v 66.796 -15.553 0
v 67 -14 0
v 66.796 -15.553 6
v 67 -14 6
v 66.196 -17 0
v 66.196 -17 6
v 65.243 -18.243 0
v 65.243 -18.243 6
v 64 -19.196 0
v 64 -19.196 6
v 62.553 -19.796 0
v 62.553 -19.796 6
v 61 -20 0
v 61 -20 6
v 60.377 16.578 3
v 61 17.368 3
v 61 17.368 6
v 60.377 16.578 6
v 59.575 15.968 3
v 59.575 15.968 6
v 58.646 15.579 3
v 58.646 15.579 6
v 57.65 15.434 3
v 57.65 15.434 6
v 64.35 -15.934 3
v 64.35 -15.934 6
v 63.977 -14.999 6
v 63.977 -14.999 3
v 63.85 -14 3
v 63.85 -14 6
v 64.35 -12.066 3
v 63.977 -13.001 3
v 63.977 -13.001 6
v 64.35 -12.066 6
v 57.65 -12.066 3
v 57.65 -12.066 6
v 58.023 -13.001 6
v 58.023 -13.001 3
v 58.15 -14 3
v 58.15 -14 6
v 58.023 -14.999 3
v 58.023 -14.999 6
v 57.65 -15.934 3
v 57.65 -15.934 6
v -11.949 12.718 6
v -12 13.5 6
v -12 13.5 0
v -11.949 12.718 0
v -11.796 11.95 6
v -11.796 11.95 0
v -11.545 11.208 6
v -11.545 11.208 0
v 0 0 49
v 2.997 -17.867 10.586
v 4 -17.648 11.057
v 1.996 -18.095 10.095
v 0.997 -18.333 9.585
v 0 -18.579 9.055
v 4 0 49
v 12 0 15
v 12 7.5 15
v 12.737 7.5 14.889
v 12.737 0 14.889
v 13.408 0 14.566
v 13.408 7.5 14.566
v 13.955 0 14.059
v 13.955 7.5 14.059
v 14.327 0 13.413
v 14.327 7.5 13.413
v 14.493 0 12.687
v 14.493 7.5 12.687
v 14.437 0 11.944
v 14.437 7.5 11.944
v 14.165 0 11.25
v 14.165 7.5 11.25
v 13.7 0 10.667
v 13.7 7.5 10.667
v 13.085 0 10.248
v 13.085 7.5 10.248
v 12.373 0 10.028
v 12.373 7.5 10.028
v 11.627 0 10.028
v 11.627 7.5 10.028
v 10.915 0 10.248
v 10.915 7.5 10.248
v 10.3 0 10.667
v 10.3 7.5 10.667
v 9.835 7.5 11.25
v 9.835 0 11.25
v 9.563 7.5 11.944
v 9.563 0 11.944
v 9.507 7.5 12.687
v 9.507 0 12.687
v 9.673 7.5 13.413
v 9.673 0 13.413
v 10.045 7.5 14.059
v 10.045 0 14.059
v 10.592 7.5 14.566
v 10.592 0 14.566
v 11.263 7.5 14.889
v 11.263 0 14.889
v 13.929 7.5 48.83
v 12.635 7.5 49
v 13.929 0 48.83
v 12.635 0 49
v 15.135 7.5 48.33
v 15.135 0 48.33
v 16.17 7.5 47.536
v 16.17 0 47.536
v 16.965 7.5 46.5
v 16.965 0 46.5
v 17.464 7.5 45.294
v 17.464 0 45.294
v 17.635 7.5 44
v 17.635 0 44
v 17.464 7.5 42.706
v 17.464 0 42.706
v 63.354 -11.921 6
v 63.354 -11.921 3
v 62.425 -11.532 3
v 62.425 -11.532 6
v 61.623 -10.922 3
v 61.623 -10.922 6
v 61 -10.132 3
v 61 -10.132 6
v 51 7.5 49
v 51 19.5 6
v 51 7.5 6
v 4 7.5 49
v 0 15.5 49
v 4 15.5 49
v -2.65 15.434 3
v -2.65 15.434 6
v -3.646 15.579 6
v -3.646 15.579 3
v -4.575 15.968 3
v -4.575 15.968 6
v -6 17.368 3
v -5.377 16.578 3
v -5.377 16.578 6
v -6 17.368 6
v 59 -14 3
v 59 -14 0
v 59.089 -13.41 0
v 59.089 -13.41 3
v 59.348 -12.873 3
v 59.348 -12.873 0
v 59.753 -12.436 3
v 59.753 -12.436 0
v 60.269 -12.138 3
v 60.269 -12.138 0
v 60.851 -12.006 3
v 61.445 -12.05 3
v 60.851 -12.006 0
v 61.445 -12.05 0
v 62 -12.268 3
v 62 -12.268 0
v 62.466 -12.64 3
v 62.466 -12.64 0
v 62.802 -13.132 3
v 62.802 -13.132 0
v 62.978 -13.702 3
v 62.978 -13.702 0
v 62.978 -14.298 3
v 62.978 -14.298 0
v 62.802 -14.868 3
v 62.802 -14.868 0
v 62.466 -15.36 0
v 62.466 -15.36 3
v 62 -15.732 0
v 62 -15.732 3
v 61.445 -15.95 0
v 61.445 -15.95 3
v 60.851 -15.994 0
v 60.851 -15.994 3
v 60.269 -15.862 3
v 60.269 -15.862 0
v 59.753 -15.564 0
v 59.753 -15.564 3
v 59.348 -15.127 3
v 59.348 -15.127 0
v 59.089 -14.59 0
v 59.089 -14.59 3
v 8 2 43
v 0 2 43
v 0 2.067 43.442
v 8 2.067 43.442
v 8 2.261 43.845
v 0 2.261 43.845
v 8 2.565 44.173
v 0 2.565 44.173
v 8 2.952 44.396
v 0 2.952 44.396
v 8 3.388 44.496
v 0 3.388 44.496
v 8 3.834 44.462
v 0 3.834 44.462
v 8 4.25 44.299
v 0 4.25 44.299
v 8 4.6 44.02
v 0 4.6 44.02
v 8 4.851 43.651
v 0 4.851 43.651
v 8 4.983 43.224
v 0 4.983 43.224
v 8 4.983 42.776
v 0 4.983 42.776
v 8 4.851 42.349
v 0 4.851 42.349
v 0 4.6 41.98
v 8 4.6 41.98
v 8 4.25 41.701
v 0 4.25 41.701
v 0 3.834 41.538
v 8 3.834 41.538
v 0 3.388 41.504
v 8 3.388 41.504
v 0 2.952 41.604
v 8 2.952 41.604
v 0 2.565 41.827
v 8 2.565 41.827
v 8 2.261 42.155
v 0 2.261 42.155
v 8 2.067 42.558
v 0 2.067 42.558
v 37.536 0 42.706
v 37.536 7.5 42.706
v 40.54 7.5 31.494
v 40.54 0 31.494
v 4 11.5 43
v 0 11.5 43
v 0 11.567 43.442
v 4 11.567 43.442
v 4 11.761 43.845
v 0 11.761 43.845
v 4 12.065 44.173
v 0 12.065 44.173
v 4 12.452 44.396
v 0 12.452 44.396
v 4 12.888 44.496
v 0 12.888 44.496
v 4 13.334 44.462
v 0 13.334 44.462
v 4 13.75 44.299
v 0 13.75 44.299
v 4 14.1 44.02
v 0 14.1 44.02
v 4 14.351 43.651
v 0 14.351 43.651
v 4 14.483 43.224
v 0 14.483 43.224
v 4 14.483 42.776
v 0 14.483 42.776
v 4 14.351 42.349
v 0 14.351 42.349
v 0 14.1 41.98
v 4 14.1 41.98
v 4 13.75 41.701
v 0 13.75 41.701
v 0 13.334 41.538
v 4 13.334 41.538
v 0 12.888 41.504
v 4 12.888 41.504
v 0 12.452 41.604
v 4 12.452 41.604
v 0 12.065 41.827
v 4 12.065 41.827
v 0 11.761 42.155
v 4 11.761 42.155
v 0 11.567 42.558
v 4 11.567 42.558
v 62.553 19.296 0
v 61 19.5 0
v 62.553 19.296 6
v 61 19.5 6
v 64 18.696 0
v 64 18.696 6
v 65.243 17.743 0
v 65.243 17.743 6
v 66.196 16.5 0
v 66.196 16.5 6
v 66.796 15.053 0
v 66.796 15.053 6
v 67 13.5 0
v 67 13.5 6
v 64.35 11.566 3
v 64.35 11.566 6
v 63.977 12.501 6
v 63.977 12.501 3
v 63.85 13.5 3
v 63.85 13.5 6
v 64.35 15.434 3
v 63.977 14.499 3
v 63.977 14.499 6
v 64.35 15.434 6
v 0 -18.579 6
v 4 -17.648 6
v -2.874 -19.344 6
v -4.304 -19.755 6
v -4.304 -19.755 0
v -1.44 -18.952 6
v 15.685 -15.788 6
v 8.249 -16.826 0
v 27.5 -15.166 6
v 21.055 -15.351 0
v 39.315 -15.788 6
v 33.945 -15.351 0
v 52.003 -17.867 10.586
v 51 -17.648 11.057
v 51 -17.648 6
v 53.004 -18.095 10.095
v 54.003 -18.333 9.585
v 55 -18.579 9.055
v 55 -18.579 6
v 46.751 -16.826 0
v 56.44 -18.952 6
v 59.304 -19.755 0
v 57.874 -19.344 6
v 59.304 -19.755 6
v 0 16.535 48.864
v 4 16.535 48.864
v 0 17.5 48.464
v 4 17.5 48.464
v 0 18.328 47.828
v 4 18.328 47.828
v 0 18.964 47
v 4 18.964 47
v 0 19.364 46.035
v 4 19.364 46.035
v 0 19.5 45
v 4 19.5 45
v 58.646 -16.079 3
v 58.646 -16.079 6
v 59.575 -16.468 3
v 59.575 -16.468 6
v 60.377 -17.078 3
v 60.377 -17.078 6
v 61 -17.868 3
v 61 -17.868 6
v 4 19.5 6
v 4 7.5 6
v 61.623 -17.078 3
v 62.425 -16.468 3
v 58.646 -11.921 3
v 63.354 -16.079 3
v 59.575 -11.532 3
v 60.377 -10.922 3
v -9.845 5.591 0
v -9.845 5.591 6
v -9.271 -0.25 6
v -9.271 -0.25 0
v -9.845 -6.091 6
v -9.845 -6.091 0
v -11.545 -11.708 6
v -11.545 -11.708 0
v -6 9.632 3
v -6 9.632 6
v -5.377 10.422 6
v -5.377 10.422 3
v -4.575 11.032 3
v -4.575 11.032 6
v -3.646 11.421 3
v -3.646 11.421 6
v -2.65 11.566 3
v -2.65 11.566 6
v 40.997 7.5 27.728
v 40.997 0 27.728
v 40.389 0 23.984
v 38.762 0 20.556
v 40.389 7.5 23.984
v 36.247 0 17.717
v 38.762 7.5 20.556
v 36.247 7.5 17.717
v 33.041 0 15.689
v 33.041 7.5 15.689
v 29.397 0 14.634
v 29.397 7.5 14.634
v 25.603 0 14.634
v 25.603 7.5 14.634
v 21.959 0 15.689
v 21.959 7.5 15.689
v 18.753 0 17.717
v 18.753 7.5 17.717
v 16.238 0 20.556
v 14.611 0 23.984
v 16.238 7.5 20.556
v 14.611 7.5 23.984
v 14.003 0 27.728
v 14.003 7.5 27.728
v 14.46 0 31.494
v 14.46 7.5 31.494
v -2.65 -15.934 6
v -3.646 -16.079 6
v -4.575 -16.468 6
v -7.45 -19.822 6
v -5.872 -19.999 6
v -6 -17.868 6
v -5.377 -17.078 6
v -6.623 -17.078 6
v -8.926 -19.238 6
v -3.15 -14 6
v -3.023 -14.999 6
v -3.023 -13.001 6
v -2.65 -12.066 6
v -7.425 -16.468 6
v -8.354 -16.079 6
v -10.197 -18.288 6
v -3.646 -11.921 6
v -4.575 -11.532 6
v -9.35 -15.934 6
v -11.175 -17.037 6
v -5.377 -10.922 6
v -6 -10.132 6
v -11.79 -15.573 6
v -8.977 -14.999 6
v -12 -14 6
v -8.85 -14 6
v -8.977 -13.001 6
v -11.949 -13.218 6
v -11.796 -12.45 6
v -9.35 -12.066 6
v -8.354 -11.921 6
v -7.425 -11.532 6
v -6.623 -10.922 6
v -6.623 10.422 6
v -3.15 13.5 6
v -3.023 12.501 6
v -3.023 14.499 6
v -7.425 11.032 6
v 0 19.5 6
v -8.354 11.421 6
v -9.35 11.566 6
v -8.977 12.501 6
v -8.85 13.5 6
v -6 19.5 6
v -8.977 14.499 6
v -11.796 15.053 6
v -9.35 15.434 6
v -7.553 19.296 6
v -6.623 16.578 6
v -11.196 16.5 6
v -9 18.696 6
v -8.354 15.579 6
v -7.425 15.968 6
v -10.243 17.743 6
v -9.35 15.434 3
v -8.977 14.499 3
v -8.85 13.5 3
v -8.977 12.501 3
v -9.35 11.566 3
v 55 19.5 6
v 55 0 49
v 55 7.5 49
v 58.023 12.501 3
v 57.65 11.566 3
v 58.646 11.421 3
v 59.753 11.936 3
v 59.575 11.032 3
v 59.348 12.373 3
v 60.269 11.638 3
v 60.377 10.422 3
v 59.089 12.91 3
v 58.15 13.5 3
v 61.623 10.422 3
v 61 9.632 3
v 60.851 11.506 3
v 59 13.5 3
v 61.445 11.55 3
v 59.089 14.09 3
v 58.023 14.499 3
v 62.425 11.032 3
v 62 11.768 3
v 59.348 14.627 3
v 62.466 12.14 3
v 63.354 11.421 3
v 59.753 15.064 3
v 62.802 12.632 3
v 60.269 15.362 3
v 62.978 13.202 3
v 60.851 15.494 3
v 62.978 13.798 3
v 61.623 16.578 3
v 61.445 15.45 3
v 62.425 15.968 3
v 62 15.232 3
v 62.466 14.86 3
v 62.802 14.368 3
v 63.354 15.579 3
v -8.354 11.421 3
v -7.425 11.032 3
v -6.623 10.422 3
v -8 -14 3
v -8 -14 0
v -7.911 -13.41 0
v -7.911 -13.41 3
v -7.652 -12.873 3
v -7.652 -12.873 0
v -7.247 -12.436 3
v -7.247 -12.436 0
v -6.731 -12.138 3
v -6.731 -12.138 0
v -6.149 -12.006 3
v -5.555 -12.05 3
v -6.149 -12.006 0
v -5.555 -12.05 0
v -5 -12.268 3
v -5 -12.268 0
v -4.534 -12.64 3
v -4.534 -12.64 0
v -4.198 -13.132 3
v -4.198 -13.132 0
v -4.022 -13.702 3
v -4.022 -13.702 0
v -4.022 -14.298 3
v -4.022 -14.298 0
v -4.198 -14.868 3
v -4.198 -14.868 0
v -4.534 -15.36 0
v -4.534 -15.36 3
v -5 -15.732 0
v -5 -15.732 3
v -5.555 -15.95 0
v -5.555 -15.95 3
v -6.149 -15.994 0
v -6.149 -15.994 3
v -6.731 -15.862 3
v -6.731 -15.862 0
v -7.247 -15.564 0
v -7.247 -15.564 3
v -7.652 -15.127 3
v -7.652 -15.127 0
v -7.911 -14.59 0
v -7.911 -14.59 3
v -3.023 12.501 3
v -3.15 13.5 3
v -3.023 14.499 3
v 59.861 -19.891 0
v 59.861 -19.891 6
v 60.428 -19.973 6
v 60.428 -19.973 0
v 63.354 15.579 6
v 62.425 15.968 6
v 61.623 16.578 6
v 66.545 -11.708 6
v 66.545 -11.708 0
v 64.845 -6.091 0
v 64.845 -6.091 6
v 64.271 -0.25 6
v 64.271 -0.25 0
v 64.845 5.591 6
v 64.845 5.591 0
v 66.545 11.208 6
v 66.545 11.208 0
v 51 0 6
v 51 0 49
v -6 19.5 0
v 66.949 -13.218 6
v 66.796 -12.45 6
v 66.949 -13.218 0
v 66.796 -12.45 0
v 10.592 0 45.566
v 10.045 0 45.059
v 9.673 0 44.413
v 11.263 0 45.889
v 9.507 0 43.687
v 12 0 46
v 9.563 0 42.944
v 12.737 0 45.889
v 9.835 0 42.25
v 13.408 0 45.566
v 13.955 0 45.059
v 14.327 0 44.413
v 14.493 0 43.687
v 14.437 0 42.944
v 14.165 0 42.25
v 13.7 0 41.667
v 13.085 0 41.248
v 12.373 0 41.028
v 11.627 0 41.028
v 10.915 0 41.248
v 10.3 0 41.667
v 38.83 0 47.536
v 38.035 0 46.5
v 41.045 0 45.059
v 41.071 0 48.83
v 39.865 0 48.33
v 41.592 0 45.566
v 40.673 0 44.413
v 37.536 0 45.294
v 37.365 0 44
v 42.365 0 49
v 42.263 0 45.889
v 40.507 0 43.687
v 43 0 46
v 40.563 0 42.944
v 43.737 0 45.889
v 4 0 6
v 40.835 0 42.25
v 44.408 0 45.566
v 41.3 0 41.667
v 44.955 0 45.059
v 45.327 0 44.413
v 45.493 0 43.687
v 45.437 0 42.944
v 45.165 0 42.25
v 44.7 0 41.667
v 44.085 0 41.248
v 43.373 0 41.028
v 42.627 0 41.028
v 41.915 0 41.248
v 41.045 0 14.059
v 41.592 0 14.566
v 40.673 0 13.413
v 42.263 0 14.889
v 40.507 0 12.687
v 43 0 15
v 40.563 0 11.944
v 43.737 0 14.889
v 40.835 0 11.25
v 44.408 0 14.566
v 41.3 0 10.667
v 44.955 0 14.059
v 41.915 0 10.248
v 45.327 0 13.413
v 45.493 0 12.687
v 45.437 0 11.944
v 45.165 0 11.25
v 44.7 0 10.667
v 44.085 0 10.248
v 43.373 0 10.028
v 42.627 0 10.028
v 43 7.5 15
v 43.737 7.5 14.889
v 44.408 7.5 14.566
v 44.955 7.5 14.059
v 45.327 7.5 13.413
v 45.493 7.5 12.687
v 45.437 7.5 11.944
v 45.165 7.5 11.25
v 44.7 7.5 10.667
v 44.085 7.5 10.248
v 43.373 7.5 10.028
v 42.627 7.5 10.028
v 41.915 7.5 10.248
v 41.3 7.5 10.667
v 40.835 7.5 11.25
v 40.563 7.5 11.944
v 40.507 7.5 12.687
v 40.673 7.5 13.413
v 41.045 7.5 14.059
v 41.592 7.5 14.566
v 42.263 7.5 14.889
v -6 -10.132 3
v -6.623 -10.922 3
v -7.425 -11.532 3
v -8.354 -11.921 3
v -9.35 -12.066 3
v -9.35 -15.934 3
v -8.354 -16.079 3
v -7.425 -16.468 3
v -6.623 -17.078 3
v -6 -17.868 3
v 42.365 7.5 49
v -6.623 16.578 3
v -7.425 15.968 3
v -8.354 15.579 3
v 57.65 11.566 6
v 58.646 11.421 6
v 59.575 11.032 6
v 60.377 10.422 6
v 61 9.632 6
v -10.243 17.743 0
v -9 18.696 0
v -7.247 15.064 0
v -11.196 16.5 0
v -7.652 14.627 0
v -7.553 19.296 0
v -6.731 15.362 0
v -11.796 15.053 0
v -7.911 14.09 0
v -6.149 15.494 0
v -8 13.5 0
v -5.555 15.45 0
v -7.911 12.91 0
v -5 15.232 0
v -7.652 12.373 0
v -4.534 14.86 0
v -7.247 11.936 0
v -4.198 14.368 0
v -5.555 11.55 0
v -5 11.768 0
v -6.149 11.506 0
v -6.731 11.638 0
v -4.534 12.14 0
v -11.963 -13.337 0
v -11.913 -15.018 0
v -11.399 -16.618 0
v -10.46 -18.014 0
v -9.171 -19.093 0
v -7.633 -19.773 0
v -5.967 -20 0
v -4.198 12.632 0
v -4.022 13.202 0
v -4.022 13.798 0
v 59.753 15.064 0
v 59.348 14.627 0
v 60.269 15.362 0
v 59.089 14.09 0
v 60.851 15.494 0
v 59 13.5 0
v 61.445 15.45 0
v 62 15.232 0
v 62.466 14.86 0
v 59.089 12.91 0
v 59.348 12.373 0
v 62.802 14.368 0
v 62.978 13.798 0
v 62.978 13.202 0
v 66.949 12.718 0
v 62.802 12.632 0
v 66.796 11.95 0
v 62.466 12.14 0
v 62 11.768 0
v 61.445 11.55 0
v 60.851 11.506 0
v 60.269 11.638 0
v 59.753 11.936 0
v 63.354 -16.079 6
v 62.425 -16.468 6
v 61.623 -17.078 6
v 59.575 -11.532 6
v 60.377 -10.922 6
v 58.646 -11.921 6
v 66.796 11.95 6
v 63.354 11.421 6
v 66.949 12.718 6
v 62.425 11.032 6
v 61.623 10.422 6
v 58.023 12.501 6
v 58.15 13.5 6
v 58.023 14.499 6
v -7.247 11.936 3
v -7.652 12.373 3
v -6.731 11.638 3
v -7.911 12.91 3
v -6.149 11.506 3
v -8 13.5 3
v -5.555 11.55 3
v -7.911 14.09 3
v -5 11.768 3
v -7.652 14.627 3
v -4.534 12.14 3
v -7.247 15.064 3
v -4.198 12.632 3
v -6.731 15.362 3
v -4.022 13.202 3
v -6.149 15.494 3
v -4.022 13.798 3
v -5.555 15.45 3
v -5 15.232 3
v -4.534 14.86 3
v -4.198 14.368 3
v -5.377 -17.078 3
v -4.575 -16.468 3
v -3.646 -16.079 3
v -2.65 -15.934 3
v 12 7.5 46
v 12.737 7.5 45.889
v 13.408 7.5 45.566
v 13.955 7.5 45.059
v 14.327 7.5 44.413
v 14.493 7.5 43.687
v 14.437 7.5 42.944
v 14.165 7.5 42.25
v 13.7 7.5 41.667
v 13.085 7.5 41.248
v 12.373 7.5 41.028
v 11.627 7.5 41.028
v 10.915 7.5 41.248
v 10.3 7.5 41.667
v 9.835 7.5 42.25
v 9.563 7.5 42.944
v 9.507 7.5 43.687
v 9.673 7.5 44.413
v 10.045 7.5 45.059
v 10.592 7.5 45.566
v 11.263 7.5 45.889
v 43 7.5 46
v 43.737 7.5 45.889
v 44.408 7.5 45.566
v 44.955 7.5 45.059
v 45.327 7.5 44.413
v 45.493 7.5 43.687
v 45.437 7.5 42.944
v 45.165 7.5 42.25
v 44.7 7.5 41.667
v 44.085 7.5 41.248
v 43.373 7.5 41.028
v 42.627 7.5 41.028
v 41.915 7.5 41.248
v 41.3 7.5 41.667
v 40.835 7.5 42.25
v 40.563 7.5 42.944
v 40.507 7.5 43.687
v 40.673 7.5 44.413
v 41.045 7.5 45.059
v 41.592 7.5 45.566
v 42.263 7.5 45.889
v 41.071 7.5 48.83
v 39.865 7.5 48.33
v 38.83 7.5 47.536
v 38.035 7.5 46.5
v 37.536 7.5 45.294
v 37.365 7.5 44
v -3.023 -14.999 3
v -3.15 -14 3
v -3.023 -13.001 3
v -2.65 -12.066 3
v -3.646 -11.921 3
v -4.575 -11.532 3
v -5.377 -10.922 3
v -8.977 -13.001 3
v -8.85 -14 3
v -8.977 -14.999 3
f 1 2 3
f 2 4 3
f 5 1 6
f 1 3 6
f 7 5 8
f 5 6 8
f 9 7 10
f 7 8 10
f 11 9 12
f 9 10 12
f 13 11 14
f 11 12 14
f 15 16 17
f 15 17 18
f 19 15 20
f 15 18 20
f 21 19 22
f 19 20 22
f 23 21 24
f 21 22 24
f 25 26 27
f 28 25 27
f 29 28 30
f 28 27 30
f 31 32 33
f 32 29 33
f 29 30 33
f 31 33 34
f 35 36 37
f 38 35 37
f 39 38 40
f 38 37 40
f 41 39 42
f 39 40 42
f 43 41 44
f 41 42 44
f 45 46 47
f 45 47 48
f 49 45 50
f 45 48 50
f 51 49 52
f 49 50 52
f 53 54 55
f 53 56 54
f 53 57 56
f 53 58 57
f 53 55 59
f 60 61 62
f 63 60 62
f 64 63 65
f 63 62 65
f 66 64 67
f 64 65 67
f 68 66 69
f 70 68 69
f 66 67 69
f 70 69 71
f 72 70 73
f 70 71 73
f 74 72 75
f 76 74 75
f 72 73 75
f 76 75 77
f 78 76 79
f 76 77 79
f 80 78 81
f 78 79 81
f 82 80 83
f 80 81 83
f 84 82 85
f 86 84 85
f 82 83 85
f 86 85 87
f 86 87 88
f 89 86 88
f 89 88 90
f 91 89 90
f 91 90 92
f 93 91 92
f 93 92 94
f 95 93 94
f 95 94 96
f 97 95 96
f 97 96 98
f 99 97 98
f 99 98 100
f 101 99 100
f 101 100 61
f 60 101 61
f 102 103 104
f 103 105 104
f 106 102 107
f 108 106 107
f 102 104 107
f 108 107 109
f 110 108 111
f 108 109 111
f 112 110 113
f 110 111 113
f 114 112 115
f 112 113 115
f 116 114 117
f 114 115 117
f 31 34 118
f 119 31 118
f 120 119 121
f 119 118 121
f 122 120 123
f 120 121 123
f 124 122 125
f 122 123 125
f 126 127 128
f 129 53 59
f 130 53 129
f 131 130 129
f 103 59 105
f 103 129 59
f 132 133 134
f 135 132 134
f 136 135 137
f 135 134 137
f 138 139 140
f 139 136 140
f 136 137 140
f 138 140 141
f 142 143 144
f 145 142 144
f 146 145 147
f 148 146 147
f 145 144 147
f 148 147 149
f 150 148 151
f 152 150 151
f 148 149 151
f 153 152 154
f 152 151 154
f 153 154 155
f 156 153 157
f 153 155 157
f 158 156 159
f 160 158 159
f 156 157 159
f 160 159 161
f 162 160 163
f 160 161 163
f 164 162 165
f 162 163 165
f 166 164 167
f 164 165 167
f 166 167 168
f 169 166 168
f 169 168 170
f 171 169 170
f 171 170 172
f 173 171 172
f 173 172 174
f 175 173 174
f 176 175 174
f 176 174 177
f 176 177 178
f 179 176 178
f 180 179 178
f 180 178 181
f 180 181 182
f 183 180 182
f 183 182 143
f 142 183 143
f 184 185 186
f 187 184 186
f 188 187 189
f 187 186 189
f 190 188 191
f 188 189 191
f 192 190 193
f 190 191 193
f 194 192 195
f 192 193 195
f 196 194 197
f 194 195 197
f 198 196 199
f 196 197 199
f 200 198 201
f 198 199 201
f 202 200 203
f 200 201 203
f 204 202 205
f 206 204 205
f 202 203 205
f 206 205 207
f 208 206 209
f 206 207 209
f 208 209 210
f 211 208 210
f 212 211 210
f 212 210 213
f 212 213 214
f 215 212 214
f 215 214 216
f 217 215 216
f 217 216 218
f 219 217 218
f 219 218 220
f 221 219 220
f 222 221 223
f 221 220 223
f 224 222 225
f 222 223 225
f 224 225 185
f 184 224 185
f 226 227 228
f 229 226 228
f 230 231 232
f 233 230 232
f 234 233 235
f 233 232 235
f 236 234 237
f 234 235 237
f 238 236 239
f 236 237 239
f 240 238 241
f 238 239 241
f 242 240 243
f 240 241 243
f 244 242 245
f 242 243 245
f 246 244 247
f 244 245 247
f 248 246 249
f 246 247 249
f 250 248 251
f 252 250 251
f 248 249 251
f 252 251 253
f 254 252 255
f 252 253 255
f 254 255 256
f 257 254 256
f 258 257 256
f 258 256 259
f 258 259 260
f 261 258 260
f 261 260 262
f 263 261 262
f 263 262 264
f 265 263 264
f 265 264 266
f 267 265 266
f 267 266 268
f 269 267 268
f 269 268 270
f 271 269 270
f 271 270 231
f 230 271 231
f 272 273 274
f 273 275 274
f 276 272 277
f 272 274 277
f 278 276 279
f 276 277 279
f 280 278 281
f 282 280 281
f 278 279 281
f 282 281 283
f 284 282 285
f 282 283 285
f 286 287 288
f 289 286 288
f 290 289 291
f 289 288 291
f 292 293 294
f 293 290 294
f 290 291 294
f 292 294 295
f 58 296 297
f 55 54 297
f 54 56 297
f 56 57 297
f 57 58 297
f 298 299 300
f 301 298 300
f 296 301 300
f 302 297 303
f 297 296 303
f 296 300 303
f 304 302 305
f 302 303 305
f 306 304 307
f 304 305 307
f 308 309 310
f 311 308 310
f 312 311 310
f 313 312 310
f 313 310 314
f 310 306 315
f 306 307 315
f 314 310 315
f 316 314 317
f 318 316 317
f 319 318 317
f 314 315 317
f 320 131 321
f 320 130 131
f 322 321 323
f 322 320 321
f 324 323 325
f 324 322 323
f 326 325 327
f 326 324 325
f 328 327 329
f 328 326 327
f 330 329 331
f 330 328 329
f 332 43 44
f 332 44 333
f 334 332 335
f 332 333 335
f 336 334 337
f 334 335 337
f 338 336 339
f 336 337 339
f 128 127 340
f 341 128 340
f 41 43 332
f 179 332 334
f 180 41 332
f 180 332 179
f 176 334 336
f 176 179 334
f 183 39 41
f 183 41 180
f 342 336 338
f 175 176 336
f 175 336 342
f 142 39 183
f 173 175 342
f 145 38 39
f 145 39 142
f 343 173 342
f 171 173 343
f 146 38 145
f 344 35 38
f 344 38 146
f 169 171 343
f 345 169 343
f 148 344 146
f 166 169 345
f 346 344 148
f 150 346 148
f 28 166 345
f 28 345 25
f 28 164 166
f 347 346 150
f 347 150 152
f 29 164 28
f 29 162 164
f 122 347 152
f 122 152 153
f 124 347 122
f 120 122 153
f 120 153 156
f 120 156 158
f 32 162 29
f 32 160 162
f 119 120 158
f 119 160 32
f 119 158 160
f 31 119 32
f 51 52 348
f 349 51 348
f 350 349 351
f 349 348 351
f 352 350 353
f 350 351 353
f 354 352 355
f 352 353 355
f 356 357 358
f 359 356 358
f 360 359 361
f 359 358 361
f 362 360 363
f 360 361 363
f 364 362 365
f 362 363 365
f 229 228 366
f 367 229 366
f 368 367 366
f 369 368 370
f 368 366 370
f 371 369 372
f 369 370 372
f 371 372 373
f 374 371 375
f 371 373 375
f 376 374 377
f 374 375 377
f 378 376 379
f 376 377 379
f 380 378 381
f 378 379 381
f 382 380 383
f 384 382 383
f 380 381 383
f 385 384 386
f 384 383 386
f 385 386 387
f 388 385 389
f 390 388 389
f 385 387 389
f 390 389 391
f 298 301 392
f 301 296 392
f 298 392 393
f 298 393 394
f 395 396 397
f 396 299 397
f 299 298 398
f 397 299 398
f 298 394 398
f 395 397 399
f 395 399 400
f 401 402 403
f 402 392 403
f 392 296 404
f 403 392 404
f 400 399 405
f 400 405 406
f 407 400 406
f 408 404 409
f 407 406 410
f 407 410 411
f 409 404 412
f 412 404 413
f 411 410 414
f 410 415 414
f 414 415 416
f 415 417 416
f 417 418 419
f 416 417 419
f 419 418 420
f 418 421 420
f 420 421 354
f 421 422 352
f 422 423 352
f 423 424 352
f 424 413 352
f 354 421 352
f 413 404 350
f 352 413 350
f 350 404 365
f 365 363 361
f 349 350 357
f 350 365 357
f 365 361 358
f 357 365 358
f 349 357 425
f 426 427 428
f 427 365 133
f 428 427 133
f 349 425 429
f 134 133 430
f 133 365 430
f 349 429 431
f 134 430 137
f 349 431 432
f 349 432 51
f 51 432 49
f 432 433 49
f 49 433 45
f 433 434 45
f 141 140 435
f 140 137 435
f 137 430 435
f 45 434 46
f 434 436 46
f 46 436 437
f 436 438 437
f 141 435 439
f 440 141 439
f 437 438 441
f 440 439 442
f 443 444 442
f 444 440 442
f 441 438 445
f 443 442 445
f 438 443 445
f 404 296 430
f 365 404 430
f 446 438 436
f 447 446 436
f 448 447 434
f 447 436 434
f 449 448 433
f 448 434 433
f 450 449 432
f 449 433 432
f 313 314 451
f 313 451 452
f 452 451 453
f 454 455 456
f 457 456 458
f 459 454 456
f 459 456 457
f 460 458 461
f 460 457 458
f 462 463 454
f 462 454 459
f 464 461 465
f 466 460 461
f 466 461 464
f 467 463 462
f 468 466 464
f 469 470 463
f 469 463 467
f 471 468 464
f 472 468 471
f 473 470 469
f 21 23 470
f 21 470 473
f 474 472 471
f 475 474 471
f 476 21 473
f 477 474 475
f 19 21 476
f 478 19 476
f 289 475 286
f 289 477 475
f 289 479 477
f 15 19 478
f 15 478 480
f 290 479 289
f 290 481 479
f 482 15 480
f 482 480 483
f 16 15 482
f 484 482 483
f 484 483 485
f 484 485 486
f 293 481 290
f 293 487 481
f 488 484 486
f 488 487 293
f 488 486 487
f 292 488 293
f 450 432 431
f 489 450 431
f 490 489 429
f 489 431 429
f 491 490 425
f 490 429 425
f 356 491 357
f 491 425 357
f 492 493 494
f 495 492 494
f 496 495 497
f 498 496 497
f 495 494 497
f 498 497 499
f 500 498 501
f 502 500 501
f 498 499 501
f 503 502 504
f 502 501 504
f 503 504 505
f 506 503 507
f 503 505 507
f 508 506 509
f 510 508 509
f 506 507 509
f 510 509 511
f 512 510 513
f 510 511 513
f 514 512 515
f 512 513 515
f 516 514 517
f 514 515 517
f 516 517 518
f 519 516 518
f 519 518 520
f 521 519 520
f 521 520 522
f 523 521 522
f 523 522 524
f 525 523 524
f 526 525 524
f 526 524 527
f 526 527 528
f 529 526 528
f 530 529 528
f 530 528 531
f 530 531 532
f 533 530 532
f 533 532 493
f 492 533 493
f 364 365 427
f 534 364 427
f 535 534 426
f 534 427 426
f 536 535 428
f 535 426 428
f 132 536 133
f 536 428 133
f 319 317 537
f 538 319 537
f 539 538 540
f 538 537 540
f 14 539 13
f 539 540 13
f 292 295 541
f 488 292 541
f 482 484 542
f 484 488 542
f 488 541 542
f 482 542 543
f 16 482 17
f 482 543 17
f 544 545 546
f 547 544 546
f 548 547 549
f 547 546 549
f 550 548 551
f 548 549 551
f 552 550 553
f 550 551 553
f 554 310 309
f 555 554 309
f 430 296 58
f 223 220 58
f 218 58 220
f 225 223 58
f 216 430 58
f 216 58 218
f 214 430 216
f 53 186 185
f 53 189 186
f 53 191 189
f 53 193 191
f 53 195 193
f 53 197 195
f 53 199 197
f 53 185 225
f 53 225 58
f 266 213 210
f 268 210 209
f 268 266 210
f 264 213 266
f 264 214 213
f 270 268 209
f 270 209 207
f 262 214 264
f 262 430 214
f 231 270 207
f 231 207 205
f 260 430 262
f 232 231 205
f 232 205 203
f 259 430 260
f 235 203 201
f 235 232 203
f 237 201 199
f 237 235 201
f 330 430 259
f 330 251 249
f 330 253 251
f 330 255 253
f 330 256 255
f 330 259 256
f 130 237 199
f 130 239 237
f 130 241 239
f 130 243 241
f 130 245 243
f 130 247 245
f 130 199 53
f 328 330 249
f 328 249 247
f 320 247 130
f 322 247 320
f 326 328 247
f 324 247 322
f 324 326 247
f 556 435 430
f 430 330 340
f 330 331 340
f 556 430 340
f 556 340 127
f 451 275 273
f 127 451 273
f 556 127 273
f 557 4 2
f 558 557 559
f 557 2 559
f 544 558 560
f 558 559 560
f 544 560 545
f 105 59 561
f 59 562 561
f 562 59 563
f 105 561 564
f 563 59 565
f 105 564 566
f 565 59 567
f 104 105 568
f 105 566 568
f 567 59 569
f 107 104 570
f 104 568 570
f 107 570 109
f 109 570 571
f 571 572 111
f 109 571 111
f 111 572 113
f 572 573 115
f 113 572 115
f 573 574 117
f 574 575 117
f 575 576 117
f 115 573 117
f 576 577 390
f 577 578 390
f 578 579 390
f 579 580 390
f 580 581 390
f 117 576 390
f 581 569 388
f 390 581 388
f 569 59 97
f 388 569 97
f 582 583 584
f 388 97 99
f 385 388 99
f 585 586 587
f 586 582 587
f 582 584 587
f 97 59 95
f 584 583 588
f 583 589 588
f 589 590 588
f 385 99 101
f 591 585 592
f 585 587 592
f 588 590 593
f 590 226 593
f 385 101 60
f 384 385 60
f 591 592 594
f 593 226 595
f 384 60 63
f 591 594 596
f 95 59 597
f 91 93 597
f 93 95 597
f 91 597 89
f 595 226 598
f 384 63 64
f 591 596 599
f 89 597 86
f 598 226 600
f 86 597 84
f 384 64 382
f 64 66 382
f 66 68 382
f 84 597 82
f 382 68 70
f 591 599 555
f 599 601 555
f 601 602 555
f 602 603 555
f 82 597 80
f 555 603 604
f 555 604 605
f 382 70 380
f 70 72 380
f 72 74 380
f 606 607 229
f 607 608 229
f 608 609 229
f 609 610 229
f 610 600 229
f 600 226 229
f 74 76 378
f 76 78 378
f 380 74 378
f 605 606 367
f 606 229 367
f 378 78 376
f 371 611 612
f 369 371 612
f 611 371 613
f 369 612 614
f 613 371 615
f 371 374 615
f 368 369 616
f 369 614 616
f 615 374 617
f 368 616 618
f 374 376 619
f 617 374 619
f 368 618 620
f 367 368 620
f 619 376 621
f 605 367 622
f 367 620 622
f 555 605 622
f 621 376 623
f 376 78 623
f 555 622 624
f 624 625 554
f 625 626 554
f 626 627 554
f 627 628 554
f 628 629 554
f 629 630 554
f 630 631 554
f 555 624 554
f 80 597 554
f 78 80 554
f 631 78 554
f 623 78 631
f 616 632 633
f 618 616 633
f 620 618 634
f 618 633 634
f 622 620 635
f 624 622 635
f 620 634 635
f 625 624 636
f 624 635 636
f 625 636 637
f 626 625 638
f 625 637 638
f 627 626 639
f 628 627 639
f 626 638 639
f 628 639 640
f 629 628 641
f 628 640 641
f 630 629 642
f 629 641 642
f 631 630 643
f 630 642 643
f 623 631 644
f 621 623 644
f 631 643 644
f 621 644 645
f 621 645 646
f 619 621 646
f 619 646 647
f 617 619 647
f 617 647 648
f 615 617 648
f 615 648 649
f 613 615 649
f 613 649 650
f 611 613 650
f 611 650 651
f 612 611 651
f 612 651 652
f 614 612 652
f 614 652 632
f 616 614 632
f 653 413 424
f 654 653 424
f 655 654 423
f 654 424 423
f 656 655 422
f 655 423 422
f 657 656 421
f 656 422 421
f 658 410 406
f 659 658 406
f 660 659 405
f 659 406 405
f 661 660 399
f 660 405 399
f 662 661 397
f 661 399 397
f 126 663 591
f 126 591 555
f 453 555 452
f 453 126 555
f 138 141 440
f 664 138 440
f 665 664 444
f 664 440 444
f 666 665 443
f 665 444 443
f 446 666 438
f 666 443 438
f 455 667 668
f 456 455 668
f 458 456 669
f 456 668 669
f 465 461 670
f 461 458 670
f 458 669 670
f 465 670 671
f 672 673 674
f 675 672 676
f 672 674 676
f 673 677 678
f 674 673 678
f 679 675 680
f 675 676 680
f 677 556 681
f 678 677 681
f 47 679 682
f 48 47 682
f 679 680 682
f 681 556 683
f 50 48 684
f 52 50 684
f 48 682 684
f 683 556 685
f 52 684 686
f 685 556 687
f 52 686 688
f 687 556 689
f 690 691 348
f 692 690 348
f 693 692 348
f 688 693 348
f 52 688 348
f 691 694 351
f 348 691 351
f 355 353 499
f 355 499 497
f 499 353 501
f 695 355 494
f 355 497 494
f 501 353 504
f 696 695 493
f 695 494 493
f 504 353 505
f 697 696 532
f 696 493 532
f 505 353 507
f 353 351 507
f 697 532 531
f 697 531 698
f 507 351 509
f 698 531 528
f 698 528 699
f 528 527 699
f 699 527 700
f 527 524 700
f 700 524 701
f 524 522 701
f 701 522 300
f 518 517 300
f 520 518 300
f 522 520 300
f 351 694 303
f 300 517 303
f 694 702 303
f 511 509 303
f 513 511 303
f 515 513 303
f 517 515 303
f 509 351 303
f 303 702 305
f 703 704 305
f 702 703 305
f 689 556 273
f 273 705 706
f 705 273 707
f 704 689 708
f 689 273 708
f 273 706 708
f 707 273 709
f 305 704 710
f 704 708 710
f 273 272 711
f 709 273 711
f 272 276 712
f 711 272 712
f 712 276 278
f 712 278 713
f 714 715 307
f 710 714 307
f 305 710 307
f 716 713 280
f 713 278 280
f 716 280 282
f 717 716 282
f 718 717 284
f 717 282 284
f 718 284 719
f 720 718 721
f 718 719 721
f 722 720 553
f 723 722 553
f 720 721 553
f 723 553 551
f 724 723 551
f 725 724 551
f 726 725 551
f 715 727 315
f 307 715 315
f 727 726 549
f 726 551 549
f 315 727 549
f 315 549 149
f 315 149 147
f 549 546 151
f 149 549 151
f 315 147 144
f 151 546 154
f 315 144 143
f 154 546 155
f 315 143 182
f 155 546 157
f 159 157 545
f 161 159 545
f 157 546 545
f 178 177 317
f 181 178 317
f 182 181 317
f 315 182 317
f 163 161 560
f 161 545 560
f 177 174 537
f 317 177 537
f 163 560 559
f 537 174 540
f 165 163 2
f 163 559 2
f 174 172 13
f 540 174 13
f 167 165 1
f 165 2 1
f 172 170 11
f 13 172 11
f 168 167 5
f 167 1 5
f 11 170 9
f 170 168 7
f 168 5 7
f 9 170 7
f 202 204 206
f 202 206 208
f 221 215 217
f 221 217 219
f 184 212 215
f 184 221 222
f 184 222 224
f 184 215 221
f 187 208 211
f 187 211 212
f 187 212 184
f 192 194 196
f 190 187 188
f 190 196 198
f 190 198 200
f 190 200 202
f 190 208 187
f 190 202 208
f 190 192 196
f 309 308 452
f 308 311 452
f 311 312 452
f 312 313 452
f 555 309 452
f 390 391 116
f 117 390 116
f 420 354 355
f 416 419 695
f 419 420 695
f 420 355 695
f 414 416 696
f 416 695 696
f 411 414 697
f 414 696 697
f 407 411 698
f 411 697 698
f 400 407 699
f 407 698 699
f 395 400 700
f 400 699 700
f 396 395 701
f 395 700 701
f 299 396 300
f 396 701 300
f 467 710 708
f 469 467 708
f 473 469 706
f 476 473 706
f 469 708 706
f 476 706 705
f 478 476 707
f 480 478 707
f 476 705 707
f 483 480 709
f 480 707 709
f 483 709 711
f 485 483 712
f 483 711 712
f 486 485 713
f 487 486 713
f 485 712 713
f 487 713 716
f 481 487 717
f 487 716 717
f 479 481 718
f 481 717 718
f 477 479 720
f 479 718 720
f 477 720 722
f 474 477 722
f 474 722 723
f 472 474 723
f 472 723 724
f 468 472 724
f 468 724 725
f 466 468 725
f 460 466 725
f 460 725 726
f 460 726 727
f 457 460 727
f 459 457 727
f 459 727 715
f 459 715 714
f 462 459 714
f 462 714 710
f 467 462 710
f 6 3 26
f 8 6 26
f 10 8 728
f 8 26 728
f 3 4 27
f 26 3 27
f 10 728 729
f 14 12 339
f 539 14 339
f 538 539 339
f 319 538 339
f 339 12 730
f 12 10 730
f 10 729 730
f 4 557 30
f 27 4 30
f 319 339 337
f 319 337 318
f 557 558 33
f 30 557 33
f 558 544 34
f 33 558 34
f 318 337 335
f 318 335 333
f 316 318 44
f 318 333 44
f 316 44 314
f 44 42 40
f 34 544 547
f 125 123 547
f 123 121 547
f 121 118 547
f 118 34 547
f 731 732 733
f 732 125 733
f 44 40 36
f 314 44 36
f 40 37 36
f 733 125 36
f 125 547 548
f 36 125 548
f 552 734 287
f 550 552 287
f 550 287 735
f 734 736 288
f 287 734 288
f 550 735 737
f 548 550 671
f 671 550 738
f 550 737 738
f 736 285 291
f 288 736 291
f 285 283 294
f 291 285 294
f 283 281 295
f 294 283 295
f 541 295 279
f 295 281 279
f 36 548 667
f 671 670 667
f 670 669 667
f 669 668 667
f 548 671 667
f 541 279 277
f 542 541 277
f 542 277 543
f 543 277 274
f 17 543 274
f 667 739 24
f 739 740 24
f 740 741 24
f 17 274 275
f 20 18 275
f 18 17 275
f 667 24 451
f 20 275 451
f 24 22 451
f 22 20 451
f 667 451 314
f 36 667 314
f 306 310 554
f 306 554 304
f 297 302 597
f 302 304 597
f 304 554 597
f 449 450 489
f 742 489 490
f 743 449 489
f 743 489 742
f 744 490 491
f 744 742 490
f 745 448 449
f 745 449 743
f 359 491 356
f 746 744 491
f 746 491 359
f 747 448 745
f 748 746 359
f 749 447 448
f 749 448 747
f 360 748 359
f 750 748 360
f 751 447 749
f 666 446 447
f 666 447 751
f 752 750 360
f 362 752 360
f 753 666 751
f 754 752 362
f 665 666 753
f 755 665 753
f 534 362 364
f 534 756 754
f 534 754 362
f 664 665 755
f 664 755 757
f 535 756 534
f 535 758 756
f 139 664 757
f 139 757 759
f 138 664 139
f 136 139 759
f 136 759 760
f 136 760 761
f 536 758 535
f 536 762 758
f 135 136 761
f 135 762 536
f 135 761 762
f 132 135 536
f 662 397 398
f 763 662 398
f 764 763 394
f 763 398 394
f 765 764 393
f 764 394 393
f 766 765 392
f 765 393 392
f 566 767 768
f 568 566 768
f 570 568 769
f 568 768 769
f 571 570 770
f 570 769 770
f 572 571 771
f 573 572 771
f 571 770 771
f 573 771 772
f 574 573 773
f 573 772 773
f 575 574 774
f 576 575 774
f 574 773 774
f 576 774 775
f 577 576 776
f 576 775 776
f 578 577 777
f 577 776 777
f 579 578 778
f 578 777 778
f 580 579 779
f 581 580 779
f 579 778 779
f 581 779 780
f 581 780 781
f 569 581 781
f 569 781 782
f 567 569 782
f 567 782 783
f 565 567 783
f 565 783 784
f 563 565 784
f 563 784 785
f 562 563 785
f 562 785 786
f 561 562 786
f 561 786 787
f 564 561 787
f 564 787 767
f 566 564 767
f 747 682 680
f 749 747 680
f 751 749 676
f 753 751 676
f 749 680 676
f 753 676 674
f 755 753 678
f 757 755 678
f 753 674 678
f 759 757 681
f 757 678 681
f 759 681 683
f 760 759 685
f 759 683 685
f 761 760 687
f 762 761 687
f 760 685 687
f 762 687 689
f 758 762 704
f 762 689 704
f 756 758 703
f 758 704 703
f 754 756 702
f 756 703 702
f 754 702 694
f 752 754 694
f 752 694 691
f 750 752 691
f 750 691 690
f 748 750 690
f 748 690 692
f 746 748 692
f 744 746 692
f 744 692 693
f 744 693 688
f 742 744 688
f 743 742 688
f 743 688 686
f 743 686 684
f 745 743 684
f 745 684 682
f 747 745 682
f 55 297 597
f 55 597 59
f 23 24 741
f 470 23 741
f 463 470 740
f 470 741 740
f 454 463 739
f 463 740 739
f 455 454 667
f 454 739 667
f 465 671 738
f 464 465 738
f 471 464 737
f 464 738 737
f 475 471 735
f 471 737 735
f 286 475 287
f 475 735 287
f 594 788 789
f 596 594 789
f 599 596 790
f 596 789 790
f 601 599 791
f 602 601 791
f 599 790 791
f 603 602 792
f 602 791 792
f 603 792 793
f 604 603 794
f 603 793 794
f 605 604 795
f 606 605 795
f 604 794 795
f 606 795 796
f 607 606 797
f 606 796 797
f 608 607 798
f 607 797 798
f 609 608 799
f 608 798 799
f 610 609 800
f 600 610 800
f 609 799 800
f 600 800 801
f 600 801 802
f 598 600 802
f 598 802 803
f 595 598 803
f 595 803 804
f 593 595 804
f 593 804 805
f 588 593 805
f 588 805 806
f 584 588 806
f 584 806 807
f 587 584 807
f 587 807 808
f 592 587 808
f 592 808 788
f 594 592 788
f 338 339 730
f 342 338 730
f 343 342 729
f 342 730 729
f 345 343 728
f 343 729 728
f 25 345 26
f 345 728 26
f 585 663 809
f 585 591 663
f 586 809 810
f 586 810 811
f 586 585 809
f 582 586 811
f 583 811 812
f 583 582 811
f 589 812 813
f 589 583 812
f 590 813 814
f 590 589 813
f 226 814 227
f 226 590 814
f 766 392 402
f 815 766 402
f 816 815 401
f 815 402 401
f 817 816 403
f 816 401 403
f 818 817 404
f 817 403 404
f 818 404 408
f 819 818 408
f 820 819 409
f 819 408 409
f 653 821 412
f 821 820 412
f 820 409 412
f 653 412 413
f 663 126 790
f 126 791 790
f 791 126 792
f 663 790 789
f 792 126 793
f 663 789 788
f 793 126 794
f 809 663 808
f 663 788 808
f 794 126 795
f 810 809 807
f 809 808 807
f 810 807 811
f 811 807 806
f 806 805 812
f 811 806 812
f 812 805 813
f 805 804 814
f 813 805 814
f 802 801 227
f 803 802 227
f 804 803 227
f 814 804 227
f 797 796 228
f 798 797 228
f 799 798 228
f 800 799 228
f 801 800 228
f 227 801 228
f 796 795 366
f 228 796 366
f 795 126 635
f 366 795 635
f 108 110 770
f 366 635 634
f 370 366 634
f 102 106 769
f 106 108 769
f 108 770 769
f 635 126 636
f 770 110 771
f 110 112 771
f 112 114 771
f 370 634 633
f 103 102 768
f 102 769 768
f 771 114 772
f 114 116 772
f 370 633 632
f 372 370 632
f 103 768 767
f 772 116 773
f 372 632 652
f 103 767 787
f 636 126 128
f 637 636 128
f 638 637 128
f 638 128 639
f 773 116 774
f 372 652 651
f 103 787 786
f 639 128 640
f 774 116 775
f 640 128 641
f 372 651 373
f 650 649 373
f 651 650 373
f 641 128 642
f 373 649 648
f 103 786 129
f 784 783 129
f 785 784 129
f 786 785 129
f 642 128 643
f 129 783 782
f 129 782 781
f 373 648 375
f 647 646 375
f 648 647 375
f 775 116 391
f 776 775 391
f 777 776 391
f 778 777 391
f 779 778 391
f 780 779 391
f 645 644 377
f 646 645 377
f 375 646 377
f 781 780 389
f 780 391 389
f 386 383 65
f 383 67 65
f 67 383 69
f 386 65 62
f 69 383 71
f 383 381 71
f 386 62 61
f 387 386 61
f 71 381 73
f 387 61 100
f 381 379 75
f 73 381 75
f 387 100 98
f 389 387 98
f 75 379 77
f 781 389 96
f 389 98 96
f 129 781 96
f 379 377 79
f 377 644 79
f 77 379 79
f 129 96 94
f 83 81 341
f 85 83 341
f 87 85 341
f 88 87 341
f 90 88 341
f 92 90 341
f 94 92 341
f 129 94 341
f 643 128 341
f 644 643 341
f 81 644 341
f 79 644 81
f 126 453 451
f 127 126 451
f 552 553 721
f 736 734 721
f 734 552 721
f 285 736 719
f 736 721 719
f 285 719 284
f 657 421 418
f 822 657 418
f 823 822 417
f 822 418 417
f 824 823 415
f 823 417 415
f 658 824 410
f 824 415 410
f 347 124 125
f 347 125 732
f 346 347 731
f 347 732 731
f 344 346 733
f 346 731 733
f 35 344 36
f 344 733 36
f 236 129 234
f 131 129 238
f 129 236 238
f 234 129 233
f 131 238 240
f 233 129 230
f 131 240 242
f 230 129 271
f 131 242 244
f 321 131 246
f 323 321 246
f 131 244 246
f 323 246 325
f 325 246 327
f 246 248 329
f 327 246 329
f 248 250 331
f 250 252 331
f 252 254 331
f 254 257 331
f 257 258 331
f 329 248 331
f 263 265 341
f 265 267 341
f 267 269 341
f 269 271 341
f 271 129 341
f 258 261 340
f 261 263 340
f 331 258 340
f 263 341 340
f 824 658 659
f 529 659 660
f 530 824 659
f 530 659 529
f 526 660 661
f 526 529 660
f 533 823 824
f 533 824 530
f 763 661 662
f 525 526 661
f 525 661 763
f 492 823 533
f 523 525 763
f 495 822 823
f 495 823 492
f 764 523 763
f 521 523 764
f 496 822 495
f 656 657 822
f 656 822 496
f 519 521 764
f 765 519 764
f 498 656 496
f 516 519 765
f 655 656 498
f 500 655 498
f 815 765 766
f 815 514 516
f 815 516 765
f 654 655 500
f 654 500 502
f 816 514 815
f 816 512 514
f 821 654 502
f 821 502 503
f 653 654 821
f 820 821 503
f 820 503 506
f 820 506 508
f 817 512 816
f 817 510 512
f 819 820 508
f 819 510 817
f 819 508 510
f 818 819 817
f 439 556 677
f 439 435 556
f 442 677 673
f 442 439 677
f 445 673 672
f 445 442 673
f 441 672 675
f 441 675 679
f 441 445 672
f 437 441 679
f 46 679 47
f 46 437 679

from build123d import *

# Parameters (mm, degrees)
BOSS_EXTRUDE1_DEPTH  = 49
SKETCH2_R            = 2.5
CUT_EXTRUDE1_DEPTH   = 8.5
SKETCH4_W            = 79
SKETCH4_H            = 39.5
BOSS_EXTRUDE2_DEPTH  = 6
BOSS_EXTRUDE3_DEPTH  = 4
SKETCH5_R            = 2
CUT_EXTRUDE3_DEPTH   = 10
BOSS_EXTRUDE4_DEPTH  = 4
SKETCH8_R            = 1.5
CUT_EXTRUDE4_DEPTH   = 8
FILLET1_R            = 6
FILLET2_R            = 5
CUT_EXTRUDE5_DEPTH   = 3
CUT_EXTRUDE6_DEPTH   = 50
FILLET3_R            = 4
CUT_EXTRUDE7_DEPTH   = 3
LPATTERN1_COUNT      = 2
LPATTERN1_PITCH      = 67
LPATTERN1_COUNT_DIR2 = 2
LPATTERN1_PITCH_DIR2 = 27.5


with BuildPart() as part:
    # Sketch1 → Boss-Extrude1 (new body)
    with BuildSketch(Plane.XY):
        Polygon((4, 7.5), (4, 19.5), (0, 19.5), (0, 0), (55, 0), (55, 7.5), align=None)
    extrude(amount=BOSS_EXTRUDE1_DEPTH)

    # Sketch2 → Cut-Extrude1 (cut, through all)
    with BuildSketch(Plane(origin=(0, 7.5, 0), x_dir=(1, 0, 0), z_dir=(0, 1, 0))):
        with Locations(Location((12, -12.5, 0), (0, 0, 270))):  # turned: the seam where the file's is
            Circle(SKETCH2_R)
        with Locations(Location((43, -12.5, 0), (0, 0, 270))):  # turned: the seam where the file's is
            Circle(SKETCH2_R)
        with Locations(Location((12, -43.5, 0), (0, 0, 270))):  # turned: the seam where the file's is
            Circle(SKETCH2_R)
        with Locations(Location((43, -43.5, 0), (0, 0, 270))):  # turned: the seam where the file's is
            Circle(SKETCH2_R)
        with BuildLine():
            Line((14.460001345, -31.494057109), (19.150704606, -49))
            Line((19.150704606, -49), (35.849295394, -49))
            Line((35.849295394, -49), (40.539998655, -31.494057109))
            ThreePointArc((40.539998655, -31.494057109), (27.5, -14.5), (14.460001345, -31.494057109))
        make_face()
    extrude(amount=-CUT_EXTRUDE1_DEPTH, mode=Mode.SUBTRACT)

    # Sketch4 → Boss-Extrude2 (add)
    with BuildSketch(Plane(origin=(0, 0, 0), x_dir=(-1, 0, 0), z_dir=(0, 0, -1))):
        with Locations((-27.5, -0.25)):
            Rectangle(SKETCH4_W, SKETCH4_H)
    extrude(amount=-BOSS_EXTRUDE2_DEPTH)

    # Sketch6 → Boss-Extrude3 (add)
    with BuildSketch(Plane.ZY):
        Polygon((6, -20), (49, 0), (6, 0), align=None)
    extrude(amount=-BOSS_EXTRUDE3_DEPTH)

    # Sketch5 → Cut-Extrude3 (cut)
    with BuildSketch(Plane(origin=(0, 0, 0), x_dir=(-1, 0, 0), z_dir=(0, 0, -1))):
        with Locations((-61, 13.5)):
            Circle(SKETCH5_R)
        with Locations((-61, -14)):
            Circle(SKETCH5_R)
        with Locations((6, 13.5)):
            Circle(SKETCH5_R)
        with Locations((6, -14)):
            Circle(SKETCH5_R)
    extrude(amount=-CUT_EXTRUDE3_DEPTH, mode=Mode.SUBTRACT)

    # Sketch7 → Boss-Extrude4 (add)
    with BuildSketch(Plane(origin=(55, 0, 0), x_dir=(0, 0, -1), z_dir=(1, 0, 0))):
        Polygon((-49, 7.5), (-6, 19.5), (0, 19.5), (0, -20), (-6, -20), (-49, 0), align=None)
    extrude(amount=-BOSS_EXTRUDE4_DEPTH)

    # Sketch8 → Cut-Extrude4 (cut)
    with BuildSketch(Plane.ZY):
        with Locations(Location((43, 13, 0), (0, 0, 270))):  # turned: the seam where the file's is
            Circle(SKETCH8_R)
        with Locations(Location((43, 3.5, 0), (0, 0, 270))):  # turned: the seam where the file's is
            Circle(SKETCH8_R)
    extrude(amount=-CUT_EXTRUDE4_DEPTH, mode=Mode.SUBTRACT)

    # Fillet1
    fillet1_edges = [part.edges().sort_by_distance(p)[0] for p in [
        (67, 19.5, 3),
        (-12, 19.5, 3),
        (-12, -20, 3),
        (67, -20, 3),
    ]]
    fillet(fillet1_edges, radius=FILLET1_R)

    # Fillet2
    fillet2_edges = [part.edges().sort_by_distance(p)[0] for p in [
        (35.849295394, 3.75, 49),
        (19.150704606, 3.75, 49),
    ]]
    fillet(fillet2_edges, radius=FILLET2_R)

    # Sketch9 → Cut-Extrude5 (cut)
    with BuildSketch(Plane.XY.offset(6)):
        Polygon((-6, 16.790896534), (-8.85, 15.145448267), (-8.85, 11.854551733), (-6, 10.209103466), (-3.15, 11.854551733), (-3.15, 15.145448267), align=None)
        Polygon((-6, -10.709103466), (-8.85, -12.354551733), (-8.85, -15.645448267), (-6, -17.290896534), (-3.15, -15.645448267), (-3.15, -12.354551733), align=None)
        Polygon((61, -10.709103466), (58.15, -12.354551733), (58.15, -15.645448267), (61, -17.290896534), (63.85, -15.645448267), (63.85, -12.354551733), align=None)
        Polygon((61, 10.209103466), (63.85, 11.854551733), (63.85, 15.145448267), (61, 16.790896534), (58.15, 15.145448267), (58.15, 11.854551733), align=None)
    extrude(amount=-CUT_EXTRUDE5_DEPTH, mode=Mode.SUBTRACT)

    # Sketch10 → Cut-Extrude6 (cut, through all)
    with BuildSketch(Plane(origin=(0, 0, 0), x_dir=(-1, 0, 0), z_dir=(0, 0, -1))):
        with BuildLine():
            Line((-61, 19.5), (-61, 26.194717678))
            Line((-61, 26.194717678), (-93.21372943, 26.194717678))
            Line((-93.21372943, 26.194717678), (-93.21372943, -32.483465835))
            Line((-93.21372943, -32.483465835), (20.656804912, -32.483465835))
            Line((20.656804912, -32.483465835), (20.656804912, 27.240467483))
            Line((20.656804912, 27.240467483), (6, 27.240467483))
            Line((6, 27.240467483), (6, 19.5))
            ThreePointArc((6, 19.5), (10.987484336, 16.835416016), (11.545111711, 11.208333333))
            ThreePointArc((11.545111711, 11.208333333), (9.270670267, -0.25), (11.545111711, -11.708333333))
            ThreePointArc((11.545111711, -11.708333333), (10.460015748, -18.013509627), (4.303797468, -19.755249514))
            ThreePointArc((4.303797468, -19.755249514), (-27.5, -15.166177907), (-59.303797468, -19.755249514))
            ThreePointArc((-59.303797468, -19.755249514), (-65.460015748, -18.013509627), (-66.545111711, -11.708333333))
            ThreePointArc((-66.545111711, -11.708333333), (-64.270670267, -0.25), (-66.545111711, 11.208333333))
            ThreePointArc((-66.545111711, 11.208333333), (-65.987484336, 16.835416016), (-61, 19.5))
        make_face()
    extrude(amount=-CUT_EXTRUDE6_DEPTH, mode=Mode.SUBTRACT)

    # Fillet3
    fillet3_edges = [part.edges().sort_by_distance(p)[0] for p in [
        (2, 19.5, 49),
    ]]
    fillet(fillet3_edges, radius=FILLET3_R)

    # Sketch11 → Cut-Extrude7 (cut)
    with BuildSketch(Plane.XY.offset(6)):
        with BuildLine():
            ThreePointArc((-9.35, 15.434123402), (-8.85, 13.5), (-9.35, 11.565876598))
            ThreePointArc((-9.35, 11.565876598), (-7.425, 11.031827599), (-6, 9.631753196))
            ThreePointArc((-6, 9.631753196), (-4.575, 11.031827599), (-2.65, 11.565876598))
            ThreePointArc((-2.65, 11.565876598), (-3.15, 13.5), (-2.65, 15.434123402))
            ThreePointArc((-2.65, 15.434123402), (-4.575, 15.968172401), (-6, 17.368246804))
            ThreePointArc((-6, 17.368246804), (-7.425, 15.968172401), (-9.35, 15.434123402))
        make_face()
    cut_extrude7 = extrude(amount=-CUT_EXTRUDE7_DEPTH, mode=Mode.SUBTRACT)

    # LPattern1: Cut-Extrude7 2 × 2
    with Locations(*[(i * LPATTERN1_PITCH, -j * LPATTERN1_PITCH_DIR2, 0) for i in range(LPATTERN1_COUNT) for j in range(LPATTERN1_COUNT_DIR2) if (i, j) != (0, 0)]):
        add(cut_extrude7, mode=Mode.SUBTRACT)


solid = part.part
